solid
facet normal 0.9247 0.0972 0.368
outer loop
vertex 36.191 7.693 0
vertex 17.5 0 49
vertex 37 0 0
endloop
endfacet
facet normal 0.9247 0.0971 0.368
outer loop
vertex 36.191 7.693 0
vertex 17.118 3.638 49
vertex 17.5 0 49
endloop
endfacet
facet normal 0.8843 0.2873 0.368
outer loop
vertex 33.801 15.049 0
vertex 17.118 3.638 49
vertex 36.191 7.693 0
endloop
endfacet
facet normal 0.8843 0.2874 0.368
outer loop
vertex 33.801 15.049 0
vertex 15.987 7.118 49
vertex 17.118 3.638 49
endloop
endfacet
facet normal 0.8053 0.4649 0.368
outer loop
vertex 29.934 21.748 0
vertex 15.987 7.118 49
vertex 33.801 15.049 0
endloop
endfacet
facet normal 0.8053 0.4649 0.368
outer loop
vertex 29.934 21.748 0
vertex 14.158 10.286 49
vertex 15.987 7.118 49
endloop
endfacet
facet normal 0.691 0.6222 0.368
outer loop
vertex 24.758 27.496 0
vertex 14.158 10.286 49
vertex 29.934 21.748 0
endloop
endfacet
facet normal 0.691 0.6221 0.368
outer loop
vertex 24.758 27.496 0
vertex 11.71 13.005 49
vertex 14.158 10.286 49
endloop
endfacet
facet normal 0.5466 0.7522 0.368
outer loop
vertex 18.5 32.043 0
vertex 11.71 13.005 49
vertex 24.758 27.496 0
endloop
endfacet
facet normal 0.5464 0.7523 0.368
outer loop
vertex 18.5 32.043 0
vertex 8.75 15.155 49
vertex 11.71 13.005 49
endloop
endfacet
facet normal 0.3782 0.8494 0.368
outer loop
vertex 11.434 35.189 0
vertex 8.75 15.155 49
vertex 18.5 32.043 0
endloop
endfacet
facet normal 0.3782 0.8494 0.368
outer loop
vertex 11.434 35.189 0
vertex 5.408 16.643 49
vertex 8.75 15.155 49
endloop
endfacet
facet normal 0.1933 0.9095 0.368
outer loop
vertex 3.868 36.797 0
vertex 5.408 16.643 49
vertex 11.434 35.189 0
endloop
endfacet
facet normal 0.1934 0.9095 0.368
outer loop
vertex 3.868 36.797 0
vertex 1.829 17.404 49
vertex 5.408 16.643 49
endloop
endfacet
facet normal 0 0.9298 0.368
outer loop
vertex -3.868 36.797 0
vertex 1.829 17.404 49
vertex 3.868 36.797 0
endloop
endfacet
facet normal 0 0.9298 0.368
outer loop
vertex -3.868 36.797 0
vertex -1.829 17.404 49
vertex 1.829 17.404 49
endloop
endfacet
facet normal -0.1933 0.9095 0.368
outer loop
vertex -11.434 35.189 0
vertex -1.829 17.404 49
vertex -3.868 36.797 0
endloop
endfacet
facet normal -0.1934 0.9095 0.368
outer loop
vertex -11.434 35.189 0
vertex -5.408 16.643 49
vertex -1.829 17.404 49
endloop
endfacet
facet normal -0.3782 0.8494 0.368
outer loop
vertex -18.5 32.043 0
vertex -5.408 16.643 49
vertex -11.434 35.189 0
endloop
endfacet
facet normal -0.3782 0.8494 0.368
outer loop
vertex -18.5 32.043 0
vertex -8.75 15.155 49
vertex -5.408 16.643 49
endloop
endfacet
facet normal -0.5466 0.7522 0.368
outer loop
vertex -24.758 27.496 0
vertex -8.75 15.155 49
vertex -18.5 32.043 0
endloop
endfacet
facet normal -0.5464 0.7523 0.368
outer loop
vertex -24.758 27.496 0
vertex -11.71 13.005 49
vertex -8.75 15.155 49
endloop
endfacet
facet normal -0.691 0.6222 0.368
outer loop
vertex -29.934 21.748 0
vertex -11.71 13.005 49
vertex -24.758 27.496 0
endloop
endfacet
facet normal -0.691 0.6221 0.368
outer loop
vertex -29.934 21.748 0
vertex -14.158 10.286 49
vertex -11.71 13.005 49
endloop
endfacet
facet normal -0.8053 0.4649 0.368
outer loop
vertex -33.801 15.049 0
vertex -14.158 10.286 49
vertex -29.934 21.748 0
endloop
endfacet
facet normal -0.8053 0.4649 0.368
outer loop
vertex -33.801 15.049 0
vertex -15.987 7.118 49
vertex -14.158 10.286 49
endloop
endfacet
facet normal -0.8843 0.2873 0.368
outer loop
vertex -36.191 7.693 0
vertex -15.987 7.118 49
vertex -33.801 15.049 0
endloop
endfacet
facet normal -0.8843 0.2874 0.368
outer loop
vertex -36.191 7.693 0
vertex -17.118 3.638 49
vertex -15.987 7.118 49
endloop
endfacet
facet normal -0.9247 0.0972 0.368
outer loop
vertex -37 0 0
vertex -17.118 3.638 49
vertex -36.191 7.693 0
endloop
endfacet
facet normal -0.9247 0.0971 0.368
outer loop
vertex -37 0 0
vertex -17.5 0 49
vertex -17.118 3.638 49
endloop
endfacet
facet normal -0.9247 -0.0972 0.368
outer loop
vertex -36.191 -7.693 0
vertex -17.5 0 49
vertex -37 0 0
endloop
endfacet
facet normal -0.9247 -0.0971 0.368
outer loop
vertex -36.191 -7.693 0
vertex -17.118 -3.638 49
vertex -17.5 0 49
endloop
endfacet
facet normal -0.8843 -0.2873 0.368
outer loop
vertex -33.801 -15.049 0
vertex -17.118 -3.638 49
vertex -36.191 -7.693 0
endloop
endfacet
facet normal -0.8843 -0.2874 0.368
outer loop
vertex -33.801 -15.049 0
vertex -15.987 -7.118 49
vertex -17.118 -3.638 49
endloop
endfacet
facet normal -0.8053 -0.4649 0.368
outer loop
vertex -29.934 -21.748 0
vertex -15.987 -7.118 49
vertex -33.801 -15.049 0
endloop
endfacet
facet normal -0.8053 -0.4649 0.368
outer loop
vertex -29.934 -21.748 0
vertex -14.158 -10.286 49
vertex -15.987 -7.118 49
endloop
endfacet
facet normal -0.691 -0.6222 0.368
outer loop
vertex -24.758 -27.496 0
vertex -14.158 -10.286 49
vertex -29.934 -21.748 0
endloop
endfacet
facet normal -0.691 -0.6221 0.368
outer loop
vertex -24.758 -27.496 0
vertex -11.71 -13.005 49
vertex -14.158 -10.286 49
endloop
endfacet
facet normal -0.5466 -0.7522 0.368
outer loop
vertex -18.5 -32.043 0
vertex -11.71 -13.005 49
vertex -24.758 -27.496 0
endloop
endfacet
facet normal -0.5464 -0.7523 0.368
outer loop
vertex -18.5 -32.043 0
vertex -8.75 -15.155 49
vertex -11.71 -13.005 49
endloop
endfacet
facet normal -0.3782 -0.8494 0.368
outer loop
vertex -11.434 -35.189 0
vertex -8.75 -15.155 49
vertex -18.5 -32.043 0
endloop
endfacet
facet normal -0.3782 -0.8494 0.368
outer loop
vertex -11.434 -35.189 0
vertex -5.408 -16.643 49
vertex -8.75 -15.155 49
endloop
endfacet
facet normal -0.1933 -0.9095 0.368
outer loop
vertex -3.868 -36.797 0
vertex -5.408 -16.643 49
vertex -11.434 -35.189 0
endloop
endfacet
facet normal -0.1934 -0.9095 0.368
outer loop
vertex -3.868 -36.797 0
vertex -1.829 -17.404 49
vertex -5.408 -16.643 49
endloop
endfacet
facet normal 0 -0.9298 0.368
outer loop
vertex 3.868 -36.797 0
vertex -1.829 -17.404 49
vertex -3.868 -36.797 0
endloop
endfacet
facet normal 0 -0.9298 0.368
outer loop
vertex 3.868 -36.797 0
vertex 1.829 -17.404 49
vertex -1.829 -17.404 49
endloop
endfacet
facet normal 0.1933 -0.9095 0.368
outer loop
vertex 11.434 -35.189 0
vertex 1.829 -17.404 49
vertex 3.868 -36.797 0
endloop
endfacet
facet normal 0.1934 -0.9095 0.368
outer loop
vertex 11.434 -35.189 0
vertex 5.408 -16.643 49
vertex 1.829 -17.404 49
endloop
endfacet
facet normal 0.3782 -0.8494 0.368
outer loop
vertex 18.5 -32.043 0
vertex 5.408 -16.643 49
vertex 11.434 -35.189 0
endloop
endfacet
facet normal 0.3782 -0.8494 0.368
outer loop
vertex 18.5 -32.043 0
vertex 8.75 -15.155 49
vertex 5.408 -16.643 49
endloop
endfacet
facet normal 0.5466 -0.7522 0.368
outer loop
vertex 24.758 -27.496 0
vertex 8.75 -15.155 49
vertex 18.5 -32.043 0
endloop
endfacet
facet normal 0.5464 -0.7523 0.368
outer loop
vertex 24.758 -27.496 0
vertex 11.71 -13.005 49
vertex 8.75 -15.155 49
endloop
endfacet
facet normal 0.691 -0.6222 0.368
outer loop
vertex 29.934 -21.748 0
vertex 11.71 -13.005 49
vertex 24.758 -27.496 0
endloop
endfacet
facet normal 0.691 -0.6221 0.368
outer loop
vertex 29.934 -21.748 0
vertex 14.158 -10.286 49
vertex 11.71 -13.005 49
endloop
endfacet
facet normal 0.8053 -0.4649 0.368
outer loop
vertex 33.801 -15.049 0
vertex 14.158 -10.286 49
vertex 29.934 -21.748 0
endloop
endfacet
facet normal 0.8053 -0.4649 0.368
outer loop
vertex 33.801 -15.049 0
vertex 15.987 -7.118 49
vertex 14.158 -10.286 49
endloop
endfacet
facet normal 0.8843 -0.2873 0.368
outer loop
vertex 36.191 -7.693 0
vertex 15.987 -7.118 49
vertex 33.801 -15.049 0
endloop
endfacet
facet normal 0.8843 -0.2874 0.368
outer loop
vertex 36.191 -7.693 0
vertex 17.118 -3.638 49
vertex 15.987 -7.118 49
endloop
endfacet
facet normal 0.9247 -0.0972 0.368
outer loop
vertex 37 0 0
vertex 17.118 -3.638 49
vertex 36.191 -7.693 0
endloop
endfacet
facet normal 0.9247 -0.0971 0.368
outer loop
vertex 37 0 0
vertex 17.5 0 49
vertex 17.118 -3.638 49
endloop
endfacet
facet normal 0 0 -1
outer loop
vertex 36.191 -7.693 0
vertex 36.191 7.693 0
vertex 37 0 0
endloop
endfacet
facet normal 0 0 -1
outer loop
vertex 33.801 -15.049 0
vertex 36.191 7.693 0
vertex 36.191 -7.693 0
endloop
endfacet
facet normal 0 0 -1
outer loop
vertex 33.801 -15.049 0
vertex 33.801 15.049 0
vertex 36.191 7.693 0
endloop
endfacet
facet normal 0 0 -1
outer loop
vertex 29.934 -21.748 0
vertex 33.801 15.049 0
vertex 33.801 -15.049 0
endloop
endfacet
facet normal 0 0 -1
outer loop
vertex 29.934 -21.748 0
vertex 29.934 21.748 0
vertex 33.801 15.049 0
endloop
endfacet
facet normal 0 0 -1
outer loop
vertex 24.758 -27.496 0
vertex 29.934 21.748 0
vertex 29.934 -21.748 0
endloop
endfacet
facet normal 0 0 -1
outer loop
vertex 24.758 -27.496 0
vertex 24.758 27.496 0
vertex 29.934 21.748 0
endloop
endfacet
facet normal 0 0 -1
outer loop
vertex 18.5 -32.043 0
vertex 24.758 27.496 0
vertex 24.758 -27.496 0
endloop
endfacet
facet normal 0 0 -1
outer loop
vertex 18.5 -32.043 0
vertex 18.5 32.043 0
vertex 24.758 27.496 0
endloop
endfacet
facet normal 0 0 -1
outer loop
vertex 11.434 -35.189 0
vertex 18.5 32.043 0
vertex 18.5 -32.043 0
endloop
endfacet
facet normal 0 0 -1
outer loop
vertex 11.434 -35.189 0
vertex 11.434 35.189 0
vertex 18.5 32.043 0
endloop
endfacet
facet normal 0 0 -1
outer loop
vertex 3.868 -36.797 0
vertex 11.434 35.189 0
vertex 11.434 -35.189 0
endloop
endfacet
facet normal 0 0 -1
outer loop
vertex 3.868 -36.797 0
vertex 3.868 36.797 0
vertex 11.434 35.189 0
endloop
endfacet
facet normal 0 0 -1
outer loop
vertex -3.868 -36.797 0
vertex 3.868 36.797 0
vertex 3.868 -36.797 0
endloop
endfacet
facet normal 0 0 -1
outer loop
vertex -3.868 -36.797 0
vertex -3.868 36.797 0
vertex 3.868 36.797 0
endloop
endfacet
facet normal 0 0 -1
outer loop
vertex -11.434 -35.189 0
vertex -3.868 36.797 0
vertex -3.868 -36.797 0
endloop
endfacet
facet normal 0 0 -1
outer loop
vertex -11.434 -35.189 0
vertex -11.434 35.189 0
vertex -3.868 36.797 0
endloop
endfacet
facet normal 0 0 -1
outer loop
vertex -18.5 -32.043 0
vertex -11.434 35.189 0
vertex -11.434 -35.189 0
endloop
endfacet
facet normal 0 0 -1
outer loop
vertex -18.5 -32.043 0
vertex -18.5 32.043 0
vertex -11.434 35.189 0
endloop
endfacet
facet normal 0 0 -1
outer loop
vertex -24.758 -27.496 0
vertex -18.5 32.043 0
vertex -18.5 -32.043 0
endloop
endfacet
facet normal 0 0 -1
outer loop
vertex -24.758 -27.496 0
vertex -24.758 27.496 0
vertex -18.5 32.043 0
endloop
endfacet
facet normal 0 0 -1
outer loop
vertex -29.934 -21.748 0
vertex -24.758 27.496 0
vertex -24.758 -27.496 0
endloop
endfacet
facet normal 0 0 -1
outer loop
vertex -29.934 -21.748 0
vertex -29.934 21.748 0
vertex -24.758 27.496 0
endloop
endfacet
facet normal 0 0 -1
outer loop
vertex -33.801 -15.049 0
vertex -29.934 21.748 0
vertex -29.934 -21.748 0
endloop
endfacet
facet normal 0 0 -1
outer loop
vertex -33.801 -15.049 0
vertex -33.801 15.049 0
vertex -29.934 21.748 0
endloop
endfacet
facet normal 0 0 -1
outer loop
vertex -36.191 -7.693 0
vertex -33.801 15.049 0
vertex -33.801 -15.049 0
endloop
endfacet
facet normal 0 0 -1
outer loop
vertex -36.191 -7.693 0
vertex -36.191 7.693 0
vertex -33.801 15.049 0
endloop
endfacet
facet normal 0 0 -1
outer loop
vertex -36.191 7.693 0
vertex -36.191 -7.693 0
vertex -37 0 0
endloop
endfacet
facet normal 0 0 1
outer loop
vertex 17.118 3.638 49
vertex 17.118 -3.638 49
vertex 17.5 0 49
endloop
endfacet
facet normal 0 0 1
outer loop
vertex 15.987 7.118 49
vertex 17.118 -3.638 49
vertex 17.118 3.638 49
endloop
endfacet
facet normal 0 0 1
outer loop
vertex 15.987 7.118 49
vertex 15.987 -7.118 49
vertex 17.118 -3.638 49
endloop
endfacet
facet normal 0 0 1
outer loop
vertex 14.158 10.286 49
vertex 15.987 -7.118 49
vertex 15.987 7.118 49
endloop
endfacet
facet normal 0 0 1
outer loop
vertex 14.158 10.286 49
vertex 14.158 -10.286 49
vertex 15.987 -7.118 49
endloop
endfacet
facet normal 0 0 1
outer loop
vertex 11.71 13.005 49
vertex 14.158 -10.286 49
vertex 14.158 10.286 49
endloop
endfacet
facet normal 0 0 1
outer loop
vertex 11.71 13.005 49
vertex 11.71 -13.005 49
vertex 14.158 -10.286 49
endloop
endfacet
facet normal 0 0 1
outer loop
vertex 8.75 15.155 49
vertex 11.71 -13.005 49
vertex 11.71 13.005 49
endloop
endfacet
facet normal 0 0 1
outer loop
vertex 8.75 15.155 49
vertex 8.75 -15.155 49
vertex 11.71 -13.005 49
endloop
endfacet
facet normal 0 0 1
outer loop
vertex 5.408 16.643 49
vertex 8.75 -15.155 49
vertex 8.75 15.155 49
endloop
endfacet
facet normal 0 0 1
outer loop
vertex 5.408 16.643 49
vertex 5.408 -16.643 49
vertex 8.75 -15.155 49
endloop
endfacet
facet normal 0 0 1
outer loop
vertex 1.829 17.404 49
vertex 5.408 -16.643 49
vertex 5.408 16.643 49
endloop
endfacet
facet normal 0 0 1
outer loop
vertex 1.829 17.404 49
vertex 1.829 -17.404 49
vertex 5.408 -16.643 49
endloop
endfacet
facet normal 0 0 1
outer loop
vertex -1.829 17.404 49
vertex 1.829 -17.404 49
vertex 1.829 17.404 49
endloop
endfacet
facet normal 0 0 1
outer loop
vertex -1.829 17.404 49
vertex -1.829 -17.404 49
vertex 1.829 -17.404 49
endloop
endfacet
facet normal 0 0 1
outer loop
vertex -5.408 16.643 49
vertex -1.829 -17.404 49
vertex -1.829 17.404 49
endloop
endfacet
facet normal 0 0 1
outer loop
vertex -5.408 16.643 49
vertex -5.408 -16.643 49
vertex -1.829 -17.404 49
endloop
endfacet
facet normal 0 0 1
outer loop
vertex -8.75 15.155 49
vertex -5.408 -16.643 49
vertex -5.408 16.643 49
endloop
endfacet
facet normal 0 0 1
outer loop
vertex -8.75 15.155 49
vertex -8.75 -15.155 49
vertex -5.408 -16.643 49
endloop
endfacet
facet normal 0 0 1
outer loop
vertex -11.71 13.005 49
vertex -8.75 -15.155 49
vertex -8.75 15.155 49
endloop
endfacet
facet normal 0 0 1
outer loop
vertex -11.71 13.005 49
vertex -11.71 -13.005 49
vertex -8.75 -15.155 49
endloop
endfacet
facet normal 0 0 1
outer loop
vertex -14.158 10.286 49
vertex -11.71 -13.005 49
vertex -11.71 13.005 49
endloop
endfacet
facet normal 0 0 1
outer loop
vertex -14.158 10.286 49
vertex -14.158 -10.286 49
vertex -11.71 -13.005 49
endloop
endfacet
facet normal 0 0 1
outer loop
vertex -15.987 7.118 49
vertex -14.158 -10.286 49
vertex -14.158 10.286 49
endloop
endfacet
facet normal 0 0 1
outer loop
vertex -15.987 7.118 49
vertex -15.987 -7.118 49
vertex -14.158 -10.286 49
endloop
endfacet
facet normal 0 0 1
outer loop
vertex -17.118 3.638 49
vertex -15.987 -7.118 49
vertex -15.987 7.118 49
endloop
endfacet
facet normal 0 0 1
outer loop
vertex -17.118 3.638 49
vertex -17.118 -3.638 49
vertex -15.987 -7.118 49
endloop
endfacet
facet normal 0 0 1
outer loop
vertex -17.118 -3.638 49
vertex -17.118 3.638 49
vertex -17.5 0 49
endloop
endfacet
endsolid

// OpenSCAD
diamExt=74;
haut=49;
diamHaut=35;

module cloche () {
     cylinder(d1=diamExt, d2=diamHaut, h=haut);
}

cloche();
